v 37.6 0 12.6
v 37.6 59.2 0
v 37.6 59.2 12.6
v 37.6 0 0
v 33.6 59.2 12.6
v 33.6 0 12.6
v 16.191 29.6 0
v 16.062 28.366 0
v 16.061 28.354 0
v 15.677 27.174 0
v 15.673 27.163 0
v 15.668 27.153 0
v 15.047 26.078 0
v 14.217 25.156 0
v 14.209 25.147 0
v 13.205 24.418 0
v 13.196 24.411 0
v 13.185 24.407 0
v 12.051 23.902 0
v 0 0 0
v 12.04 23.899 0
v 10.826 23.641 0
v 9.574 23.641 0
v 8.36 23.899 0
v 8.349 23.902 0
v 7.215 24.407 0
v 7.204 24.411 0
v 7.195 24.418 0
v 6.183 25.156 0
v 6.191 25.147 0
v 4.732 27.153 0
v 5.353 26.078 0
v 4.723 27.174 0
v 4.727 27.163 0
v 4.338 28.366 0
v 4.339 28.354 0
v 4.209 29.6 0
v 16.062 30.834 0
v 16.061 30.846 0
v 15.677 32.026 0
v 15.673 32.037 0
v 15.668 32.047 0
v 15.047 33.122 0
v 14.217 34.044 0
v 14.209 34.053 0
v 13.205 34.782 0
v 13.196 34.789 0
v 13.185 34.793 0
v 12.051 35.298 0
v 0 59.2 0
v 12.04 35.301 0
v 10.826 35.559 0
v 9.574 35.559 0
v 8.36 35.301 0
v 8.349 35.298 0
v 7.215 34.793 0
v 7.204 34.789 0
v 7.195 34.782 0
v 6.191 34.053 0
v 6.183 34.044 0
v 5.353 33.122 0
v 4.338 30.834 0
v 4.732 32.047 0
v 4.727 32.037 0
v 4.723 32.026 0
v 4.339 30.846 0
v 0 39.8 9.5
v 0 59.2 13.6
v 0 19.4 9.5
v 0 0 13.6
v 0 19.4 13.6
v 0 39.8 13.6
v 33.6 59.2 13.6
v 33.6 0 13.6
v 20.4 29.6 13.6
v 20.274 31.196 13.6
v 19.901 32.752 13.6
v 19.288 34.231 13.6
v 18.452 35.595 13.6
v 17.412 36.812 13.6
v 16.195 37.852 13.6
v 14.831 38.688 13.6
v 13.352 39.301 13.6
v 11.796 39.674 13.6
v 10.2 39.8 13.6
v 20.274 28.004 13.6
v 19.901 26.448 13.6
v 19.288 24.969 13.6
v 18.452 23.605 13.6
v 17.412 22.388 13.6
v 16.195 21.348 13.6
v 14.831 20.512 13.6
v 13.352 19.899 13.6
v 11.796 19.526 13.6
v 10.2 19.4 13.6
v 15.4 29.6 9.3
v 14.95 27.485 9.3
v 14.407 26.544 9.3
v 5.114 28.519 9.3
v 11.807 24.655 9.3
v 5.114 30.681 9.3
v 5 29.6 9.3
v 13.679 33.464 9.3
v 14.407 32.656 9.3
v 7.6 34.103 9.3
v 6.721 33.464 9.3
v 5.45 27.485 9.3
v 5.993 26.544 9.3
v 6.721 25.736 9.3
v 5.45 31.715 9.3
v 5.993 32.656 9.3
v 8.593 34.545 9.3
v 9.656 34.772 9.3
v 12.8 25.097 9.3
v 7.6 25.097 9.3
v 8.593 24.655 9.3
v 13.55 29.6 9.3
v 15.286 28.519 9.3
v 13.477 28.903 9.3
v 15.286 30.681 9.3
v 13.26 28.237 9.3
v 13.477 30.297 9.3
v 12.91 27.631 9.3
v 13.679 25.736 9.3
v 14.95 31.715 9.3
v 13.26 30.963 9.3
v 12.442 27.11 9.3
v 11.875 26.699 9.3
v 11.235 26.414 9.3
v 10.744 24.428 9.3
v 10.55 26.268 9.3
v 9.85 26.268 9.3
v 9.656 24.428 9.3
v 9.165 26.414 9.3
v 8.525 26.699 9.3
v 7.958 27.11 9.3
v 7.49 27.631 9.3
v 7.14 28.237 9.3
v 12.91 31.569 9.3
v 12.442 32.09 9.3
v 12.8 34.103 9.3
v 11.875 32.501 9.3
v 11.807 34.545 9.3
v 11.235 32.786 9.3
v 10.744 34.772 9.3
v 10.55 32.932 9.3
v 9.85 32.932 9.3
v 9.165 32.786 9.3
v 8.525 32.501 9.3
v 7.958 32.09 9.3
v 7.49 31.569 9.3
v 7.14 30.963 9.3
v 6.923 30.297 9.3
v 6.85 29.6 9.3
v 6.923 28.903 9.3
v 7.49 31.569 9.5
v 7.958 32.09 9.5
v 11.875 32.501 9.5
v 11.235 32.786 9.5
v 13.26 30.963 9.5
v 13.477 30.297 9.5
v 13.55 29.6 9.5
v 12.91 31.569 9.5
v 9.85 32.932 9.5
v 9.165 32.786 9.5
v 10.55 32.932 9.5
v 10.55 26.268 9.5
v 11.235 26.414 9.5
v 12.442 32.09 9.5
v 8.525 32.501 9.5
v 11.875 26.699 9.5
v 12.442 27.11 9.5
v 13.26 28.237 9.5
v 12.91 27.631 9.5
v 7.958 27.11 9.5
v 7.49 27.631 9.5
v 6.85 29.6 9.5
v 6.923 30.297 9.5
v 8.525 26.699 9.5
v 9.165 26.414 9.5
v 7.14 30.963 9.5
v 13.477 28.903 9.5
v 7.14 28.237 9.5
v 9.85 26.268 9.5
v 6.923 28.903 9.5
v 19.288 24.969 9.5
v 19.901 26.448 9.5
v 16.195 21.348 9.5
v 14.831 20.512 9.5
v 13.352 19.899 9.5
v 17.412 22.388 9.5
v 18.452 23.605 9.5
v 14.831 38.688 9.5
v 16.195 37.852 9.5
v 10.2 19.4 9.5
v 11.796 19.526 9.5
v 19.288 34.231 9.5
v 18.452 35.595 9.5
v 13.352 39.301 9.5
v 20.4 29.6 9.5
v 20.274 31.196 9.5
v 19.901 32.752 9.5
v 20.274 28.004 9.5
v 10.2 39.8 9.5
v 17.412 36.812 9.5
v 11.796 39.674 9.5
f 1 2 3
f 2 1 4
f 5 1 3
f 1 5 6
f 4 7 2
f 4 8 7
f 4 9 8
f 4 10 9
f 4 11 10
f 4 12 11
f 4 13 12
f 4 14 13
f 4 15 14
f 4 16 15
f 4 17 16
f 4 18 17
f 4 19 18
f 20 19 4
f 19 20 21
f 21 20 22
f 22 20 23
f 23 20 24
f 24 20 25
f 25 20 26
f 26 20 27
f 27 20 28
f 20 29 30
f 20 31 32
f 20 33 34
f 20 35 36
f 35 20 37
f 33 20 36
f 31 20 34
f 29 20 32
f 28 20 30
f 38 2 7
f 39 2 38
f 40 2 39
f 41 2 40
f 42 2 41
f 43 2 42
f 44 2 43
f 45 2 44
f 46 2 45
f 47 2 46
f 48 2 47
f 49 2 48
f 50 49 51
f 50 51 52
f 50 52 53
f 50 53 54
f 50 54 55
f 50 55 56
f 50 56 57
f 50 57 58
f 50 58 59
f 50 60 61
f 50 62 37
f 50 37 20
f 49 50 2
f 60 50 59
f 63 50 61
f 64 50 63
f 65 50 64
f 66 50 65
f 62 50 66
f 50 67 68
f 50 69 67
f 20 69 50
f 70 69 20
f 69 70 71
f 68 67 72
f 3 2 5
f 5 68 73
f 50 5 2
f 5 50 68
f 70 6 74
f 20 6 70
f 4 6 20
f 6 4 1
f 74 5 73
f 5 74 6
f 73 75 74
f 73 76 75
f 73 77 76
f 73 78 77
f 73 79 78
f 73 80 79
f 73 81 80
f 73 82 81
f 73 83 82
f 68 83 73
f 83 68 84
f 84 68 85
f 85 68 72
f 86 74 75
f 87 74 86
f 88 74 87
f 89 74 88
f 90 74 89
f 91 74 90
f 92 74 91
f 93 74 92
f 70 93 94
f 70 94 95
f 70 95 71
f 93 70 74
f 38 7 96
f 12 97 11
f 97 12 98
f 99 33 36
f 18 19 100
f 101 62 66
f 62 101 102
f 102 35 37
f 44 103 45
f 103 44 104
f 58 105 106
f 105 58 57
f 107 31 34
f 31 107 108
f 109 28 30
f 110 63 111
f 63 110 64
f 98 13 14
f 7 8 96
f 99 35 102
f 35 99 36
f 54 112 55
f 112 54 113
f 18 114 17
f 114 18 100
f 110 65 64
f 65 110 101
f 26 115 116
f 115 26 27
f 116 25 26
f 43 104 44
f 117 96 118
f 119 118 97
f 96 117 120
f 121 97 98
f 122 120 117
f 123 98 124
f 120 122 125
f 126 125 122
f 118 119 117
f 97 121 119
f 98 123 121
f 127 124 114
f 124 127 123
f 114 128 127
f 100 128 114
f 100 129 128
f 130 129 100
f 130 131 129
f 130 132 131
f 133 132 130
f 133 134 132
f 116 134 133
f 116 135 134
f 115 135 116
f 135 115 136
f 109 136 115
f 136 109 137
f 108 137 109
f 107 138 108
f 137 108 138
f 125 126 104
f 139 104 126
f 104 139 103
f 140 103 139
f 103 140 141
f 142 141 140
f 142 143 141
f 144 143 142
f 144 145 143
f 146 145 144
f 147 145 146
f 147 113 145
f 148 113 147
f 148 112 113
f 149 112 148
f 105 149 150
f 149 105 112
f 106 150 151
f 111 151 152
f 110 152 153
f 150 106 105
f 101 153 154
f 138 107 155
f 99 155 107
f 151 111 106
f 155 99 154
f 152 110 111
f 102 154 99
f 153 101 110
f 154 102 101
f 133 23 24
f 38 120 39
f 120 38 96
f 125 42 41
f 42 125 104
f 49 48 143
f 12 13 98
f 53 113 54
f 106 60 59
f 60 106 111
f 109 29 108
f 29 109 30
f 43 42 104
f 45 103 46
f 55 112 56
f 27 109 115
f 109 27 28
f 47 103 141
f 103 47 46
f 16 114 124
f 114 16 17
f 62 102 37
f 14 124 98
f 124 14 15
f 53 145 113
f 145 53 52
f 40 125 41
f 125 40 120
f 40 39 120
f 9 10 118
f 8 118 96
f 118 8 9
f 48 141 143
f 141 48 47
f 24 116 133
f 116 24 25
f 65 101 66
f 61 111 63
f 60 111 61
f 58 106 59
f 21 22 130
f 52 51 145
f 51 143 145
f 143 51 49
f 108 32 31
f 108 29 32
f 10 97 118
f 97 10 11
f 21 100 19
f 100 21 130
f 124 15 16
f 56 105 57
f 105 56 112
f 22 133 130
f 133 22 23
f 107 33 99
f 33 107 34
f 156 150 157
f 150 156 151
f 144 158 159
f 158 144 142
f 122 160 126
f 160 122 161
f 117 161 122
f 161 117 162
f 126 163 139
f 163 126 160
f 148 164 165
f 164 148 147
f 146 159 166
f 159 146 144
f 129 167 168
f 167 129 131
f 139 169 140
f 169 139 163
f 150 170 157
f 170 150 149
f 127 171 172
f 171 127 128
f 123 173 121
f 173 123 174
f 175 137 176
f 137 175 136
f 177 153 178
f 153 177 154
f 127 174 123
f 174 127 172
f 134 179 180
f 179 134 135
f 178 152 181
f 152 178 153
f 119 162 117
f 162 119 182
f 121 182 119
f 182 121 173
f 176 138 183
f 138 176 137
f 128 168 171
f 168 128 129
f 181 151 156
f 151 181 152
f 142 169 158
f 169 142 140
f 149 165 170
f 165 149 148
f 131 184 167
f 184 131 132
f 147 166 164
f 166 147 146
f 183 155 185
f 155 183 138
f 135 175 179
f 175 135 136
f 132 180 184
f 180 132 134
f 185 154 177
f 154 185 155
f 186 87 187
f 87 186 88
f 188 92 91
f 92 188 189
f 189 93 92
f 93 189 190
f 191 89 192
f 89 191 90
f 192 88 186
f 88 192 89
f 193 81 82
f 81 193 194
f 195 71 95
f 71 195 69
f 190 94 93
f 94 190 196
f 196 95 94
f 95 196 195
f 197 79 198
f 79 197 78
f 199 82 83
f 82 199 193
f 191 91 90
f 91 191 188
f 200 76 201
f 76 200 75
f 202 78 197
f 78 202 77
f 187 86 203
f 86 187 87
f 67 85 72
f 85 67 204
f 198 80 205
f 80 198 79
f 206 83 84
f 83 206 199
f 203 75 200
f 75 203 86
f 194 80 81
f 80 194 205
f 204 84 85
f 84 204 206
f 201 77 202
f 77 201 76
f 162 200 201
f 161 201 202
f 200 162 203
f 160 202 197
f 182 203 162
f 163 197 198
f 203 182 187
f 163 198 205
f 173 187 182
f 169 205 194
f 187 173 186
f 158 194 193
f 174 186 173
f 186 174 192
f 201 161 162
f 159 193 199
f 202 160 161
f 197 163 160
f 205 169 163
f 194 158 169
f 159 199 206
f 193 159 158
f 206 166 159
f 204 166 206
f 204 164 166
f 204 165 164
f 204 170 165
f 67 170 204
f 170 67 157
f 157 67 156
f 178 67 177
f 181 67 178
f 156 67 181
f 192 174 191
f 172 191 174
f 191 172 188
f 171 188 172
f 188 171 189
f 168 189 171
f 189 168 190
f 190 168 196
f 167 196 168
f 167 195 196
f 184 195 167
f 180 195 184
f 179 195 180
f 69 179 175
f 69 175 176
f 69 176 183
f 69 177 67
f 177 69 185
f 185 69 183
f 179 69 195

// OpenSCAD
// To fit a brass letterbox flap onn a blind door

// It should fit between the 2 glaslatten
br_d=12.5+0.1;
br_h=59.6-0.4;

// We need 2 smaller brackets each are wide
br_w=38-0.4;

// Bracket needs mounting holes
mnt_d1=11.6+0.4;
mnt_d2=10+0.4;
mnt_h=8.8+0.4;
mnt_off=21.6+(11.6/2);

// Squar nut 
nut_d=16.4+4;
nut_h=4;

mnt_d3=6.3+0.4;

difference() {
    union() {  
      cube([br_w,br_h,br_d]);      
      cube([br_w-4,br_h,br_d+1]);
    }
    translate([br_w-mnt_off,br_h/2,-0.1])
        union() {
            cylinder(h=mnt_h+0.2,d1=mnt_d1,d2=mnt_d2,$fn=30);
            cylinder(h=br_h+0.2,d=mnt_d3,$fn=30);
            translate([0,0,br_d+1-4])
                hull() {
                    cylinder(h=nut_h+0.2,d=nut_d,$fn=40);
                    translate([-br_w+mnt_off-nut_d,-nut_d/2,0])
                        cube([nut_d,nut_d,nut_h+0.2]);
                }
        }
}
